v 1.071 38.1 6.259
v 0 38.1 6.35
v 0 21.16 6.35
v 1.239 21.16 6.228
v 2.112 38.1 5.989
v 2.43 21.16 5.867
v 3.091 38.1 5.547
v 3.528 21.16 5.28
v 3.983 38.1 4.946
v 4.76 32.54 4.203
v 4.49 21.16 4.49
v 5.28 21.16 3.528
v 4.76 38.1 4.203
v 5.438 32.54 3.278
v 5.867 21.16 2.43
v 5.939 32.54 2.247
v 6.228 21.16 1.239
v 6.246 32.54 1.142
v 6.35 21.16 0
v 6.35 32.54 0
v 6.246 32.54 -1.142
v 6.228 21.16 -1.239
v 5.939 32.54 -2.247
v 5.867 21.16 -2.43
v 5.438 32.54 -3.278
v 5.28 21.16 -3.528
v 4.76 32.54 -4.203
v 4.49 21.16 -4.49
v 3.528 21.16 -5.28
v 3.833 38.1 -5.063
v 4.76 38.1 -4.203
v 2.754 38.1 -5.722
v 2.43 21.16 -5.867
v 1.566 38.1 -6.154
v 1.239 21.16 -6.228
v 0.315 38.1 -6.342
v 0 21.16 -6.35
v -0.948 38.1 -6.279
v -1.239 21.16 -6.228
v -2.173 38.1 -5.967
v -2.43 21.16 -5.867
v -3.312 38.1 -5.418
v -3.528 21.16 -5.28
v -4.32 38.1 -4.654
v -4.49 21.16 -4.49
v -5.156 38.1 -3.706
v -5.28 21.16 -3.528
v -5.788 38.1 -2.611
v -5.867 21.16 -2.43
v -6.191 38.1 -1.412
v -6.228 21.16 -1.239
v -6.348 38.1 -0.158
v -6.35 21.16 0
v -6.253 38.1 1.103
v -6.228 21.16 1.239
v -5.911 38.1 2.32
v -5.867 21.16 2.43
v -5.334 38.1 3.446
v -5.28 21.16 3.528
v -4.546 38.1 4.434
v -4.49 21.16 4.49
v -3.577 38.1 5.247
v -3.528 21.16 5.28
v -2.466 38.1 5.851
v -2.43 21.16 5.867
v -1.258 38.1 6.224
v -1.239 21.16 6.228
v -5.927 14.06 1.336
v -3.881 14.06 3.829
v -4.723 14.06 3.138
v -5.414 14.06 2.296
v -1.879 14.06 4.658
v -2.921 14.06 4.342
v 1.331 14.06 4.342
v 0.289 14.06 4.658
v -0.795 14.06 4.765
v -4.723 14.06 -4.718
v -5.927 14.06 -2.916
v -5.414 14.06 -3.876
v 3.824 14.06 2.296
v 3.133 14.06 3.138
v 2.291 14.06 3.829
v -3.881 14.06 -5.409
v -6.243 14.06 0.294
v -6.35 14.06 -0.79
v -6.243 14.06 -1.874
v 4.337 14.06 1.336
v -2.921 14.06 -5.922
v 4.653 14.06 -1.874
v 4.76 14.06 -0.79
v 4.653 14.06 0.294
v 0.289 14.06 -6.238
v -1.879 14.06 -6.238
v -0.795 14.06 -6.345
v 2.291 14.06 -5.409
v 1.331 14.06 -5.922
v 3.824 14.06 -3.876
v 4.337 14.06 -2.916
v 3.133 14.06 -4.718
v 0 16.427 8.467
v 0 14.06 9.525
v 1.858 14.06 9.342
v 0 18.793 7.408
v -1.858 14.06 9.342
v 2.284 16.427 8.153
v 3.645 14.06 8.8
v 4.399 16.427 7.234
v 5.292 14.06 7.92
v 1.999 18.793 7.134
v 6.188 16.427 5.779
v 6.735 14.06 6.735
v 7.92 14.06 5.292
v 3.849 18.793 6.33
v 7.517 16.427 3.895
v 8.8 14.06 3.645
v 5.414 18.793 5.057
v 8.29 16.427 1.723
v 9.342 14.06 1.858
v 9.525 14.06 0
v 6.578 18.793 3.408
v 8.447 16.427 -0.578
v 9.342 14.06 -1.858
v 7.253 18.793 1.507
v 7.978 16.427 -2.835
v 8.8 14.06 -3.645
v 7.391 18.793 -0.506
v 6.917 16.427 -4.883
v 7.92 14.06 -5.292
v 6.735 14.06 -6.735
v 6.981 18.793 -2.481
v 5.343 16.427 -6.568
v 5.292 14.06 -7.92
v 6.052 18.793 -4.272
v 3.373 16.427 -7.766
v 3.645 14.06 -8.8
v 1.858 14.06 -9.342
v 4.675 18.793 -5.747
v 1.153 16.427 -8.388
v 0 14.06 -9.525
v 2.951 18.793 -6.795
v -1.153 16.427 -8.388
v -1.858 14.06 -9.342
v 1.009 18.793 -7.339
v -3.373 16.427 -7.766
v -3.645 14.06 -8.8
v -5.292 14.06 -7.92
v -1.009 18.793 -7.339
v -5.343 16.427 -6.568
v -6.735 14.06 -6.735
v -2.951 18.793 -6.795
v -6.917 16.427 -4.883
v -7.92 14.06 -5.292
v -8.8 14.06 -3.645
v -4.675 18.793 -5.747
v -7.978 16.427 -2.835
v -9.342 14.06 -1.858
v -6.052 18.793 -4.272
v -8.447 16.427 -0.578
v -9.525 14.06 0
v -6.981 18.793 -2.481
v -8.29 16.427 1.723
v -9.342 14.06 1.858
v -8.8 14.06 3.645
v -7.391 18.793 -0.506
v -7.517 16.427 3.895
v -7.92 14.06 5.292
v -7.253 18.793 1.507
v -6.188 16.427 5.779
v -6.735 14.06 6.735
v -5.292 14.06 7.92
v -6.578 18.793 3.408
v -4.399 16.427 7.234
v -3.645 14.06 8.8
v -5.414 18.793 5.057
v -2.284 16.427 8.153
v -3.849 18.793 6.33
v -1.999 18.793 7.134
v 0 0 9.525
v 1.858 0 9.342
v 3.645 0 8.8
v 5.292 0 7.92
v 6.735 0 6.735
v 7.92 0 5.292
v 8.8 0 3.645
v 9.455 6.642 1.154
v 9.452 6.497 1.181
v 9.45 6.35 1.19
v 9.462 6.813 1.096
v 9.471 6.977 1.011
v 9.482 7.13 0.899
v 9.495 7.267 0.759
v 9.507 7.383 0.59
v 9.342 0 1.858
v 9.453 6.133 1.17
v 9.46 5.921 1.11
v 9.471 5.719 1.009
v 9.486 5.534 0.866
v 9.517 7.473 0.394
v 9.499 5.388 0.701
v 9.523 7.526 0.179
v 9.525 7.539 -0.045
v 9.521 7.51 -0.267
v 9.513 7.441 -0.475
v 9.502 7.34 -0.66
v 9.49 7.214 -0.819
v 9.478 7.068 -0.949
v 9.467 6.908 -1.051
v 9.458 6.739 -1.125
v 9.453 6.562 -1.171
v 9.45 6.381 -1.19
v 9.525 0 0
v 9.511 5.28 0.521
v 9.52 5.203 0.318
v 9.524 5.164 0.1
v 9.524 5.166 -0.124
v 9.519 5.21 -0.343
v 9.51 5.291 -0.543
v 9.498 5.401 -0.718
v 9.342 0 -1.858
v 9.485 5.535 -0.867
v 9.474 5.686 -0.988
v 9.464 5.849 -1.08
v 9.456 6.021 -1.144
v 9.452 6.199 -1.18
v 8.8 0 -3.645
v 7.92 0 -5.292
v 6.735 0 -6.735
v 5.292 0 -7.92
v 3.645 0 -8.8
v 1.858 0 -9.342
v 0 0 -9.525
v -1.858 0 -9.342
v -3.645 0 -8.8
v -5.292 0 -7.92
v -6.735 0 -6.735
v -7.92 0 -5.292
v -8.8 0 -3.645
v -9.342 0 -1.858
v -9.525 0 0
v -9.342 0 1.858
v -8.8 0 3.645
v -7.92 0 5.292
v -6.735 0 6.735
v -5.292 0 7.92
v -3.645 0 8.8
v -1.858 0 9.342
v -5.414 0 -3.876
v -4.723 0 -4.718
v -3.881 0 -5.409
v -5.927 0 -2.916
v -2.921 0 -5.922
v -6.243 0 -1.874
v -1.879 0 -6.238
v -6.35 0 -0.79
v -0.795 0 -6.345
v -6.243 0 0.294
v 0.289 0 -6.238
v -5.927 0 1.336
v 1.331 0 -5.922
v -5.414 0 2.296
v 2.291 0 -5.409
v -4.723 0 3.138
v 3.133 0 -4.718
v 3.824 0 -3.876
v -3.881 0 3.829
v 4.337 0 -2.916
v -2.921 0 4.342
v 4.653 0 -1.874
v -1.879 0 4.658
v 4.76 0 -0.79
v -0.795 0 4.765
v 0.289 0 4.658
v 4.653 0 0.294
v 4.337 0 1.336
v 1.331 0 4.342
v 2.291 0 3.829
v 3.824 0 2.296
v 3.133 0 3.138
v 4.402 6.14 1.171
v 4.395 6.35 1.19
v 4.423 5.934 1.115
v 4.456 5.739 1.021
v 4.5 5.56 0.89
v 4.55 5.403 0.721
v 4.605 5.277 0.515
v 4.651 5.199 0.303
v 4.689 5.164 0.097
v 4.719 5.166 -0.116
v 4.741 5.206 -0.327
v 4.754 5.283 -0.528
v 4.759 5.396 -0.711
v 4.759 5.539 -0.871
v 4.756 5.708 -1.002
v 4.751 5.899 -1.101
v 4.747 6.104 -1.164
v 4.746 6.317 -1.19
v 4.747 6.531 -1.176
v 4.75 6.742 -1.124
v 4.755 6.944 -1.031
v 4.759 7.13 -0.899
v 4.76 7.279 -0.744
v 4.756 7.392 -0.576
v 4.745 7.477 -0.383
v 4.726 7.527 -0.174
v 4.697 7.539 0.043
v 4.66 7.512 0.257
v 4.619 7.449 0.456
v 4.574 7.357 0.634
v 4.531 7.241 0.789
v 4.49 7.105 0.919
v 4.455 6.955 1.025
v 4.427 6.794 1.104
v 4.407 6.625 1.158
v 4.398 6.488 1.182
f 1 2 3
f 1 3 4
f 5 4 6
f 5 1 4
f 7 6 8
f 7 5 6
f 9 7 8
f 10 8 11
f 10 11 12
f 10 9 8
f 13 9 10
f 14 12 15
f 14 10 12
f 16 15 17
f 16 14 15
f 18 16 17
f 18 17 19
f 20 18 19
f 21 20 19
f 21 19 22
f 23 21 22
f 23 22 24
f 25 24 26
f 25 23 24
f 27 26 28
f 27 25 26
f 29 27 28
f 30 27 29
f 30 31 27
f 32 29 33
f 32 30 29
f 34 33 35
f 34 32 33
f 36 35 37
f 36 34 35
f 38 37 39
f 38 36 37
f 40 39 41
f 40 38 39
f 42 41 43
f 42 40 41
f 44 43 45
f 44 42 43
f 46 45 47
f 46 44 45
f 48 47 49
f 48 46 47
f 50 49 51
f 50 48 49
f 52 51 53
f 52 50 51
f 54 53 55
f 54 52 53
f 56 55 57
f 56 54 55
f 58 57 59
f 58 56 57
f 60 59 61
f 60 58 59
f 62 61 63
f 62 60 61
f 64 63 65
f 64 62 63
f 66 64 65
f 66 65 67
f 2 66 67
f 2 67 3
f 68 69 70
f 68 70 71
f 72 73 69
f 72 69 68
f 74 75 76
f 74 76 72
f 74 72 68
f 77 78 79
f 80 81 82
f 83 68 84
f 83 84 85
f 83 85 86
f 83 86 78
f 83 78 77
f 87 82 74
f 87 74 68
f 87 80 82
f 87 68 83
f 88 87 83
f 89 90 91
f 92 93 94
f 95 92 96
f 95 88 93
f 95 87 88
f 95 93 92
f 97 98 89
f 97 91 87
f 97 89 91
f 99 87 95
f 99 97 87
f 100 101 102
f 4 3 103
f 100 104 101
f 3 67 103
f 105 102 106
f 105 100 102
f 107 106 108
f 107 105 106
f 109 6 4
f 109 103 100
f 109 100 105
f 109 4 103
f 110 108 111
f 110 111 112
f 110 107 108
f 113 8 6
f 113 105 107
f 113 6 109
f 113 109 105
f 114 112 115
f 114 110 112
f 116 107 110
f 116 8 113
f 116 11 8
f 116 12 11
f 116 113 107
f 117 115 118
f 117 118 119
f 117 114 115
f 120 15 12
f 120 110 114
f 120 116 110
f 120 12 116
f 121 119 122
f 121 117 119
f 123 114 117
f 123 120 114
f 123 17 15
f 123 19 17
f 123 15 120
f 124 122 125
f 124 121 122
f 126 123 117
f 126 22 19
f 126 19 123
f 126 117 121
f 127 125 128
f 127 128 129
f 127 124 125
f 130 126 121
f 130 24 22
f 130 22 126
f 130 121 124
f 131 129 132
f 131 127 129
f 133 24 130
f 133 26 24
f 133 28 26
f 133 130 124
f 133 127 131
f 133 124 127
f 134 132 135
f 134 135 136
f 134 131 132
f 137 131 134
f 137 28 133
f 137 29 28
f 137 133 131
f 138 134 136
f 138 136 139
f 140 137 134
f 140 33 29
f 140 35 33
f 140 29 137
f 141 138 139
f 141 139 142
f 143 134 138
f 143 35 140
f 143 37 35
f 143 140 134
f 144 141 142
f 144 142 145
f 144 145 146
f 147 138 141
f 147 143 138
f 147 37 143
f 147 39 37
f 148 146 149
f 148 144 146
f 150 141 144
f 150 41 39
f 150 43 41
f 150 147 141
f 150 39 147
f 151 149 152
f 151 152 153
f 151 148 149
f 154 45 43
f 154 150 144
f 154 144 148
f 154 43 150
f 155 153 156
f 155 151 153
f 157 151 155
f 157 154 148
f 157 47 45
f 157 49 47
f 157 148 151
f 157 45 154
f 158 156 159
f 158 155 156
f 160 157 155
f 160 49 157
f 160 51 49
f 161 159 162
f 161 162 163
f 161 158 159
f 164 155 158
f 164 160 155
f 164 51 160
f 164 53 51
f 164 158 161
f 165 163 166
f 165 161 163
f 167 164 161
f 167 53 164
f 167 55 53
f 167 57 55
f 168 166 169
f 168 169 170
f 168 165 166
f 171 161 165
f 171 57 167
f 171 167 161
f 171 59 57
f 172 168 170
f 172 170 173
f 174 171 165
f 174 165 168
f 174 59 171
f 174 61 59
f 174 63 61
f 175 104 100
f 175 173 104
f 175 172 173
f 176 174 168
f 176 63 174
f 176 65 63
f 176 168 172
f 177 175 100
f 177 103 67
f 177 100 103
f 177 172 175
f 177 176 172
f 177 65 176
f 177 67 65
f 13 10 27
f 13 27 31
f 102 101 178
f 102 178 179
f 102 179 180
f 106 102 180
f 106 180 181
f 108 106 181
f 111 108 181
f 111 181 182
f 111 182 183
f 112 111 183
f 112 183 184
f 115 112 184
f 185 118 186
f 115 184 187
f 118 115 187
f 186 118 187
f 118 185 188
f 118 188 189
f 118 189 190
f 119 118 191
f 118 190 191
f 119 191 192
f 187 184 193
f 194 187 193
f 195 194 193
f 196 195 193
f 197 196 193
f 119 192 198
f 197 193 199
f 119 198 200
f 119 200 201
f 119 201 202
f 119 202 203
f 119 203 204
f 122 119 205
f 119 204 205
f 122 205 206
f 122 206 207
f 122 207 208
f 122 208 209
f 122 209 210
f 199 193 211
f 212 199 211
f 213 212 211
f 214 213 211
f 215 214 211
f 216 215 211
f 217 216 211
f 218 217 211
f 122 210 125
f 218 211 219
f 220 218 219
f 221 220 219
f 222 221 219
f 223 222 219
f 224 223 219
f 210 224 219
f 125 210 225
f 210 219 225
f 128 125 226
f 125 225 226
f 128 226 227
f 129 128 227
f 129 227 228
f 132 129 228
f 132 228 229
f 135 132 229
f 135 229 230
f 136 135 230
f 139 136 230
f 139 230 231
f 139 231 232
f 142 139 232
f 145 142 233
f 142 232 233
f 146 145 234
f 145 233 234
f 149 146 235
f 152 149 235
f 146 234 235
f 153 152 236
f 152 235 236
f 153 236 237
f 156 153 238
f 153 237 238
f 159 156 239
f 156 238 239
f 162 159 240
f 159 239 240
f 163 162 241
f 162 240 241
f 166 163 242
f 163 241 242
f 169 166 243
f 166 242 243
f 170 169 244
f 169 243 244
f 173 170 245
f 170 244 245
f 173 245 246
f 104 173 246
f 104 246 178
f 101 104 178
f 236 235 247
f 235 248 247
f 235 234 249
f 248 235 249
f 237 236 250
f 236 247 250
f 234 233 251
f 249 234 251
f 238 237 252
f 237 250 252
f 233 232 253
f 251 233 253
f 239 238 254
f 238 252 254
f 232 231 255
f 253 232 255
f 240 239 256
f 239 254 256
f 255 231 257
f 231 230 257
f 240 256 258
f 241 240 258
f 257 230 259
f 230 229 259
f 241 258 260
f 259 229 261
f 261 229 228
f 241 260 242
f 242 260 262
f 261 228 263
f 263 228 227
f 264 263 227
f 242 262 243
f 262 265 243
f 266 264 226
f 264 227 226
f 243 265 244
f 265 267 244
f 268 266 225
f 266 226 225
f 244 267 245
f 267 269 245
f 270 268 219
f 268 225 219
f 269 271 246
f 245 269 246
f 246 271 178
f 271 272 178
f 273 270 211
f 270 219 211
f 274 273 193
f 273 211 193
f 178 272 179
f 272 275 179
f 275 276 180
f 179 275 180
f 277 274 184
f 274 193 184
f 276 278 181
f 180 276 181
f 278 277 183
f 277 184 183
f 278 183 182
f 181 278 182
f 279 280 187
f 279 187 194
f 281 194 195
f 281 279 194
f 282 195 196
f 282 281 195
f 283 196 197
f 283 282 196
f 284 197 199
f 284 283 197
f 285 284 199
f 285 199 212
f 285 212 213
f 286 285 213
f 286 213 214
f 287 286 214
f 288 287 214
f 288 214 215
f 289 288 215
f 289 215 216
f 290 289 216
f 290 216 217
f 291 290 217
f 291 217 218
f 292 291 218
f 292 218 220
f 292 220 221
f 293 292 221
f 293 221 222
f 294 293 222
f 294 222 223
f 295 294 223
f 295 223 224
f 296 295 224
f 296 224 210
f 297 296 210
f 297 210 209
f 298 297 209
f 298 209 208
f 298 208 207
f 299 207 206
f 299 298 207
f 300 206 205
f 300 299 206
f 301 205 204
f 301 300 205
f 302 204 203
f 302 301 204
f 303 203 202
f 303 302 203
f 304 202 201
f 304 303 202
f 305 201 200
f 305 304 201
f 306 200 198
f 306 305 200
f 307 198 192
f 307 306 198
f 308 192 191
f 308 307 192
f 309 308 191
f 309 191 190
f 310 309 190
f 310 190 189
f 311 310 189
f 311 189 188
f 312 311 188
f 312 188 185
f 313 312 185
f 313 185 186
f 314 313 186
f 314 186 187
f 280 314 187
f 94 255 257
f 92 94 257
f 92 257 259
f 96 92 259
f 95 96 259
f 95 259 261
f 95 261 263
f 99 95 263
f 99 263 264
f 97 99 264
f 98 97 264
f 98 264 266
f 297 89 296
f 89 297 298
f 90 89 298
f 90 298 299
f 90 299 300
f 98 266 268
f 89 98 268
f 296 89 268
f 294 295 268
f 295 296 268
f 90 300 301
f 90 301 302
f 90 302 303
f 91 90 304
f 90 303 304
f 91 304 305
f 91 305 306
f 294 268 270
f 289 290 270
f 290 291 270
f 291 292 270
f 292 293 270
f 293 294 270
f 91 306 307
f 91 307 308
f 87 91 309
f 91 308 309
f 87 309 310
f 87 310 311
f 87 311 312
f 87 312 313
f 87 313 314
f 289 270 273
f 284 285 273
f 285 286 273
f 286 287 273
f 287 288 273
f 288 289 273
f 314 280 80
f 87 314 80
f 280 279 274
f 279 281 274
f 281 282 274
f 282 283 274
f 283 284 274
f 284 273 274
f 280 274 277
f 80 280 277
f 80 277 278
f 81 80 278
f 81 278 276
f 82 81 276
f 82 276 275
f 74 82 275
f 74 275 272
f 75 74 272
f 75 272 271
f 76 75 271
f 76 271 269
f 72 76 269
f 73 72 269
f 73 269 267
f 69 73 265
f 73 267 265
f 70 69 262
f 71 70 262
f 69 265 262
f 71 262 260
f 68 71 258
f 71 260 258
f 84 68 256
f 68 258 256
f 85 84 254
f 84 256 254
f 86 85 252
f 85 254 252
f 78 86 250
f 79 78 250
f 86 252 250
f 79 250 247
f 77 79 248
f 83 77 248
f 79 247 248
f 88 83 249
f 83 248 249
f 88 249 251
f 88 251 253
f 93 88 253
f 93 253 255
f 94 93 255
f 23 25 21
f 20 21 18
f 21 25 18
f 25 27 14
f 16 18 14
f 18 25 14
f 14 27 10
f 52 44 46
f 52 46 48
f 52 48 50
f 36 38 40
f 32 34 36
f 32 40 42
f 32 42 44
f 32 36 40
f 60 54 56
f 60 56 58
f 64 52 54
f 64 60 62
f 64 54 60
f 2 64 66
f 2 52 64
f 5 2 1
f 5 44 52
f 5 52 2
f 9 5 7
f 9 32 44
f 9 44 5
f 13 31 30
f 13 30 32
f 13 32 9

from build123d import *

# Parameters (mm, degrees)
SKETCH1_R           = 9.525
BOSS_EXTRUDE1_DEPTH = 14.06
SKETCH2_R           = 6.35
BOSS_EXTRUDE2_DEPTH = 16.94
SKETCH3_W           = 1.59
SKETCH3_H           = 5.56
CUT_EXTRUDE1_DEPTH  = 8.47
SKETCH5_R           = 1.19
CUT_EXTRUDE3_DEPTH  = 14.06
SKETCH4_R           = 5.555
CUT_EXTRUDE4_DEPTH  = 14.06


with BuildPart() as part:
    # Sketch1 → Boss-Extrude1 (new body)
    with BuildSketch(Plane(origin=(0, 0, 0), x_dir=(1, 0, 0), z_dir=(0, 1, 0))):
        with Locations(Location((0, 0, 0), (0, 0, 270))):
            Circle(SKETCH1_R)
    extrude(amount=BOSS_EXTRUDE1_DEPTH)



with BuildPart() as body_2:
    # Sketch2 → Boss-Extrude2 (new body)
    with BuildSketch(Plane(origin=(0, 38.1, 0), x_dir=(1, 0, 0), z_dir=(0, 1, 0))):
        with Locations(Location((0, 0, 0), (0, 0, 270))):
            Circle(SKETCH2_R)
    extrude(amount=-BOSS_EXTRUDE2_DEPTH)


with BuildPart() as part_1:
    add(part.part)

    add(body_2.part)  # loft1 joins it to this body
    # loft up to a face of the part (loft1)
    loft([Face(Wire([part_1.edges().sort_by_distance((6.943426176, 14.06, -6.520311184))[0]])), Face(Wire([part_1.edges().sort_by_distance((-4.628950784, 21.16, -4.346874123))[0]]))])

    # Sketch3 → Cut-Extrude1 (cut, symmetric)
    with BuildSketch(Plane.XY):
        with Locations((5.555, 35.32)):
            Rectangle(SKETCH3_W, SKETCH3_H)
    extrude(amount=CUT_EXTRUDE1_DEPTH, both=True, mode=Mode.SUBTRACT)

    # Sketch5 → Cut-Extrude3 (cut)
    with BuildSketch(Plane(origin=(0, 0, 0), x_dir=(0, 0, -1), z_dir=(1, 0, 0))):
        with Locations(Location((0, 6.35, 0), (0, 0, 180))):
            Circle(SKETCH5_R)
    extrude(amount=CUT_EXTRUDE3_DEPTH, mode=Mode.SUBTRACT)

    # Sketch4 → Cut-Extrude4 (cut)
    with BuildSketch(Plane.XZ):
        with Locations(Location((-0.795, -0.79, 0), (0, 0, 270))):
            Circle(SKETCH4_R)
    extrude(amount=-CUT_EXTRUDE4_DEPTH, mode=Mode.SUBTRACT)


solid = part_1.part
